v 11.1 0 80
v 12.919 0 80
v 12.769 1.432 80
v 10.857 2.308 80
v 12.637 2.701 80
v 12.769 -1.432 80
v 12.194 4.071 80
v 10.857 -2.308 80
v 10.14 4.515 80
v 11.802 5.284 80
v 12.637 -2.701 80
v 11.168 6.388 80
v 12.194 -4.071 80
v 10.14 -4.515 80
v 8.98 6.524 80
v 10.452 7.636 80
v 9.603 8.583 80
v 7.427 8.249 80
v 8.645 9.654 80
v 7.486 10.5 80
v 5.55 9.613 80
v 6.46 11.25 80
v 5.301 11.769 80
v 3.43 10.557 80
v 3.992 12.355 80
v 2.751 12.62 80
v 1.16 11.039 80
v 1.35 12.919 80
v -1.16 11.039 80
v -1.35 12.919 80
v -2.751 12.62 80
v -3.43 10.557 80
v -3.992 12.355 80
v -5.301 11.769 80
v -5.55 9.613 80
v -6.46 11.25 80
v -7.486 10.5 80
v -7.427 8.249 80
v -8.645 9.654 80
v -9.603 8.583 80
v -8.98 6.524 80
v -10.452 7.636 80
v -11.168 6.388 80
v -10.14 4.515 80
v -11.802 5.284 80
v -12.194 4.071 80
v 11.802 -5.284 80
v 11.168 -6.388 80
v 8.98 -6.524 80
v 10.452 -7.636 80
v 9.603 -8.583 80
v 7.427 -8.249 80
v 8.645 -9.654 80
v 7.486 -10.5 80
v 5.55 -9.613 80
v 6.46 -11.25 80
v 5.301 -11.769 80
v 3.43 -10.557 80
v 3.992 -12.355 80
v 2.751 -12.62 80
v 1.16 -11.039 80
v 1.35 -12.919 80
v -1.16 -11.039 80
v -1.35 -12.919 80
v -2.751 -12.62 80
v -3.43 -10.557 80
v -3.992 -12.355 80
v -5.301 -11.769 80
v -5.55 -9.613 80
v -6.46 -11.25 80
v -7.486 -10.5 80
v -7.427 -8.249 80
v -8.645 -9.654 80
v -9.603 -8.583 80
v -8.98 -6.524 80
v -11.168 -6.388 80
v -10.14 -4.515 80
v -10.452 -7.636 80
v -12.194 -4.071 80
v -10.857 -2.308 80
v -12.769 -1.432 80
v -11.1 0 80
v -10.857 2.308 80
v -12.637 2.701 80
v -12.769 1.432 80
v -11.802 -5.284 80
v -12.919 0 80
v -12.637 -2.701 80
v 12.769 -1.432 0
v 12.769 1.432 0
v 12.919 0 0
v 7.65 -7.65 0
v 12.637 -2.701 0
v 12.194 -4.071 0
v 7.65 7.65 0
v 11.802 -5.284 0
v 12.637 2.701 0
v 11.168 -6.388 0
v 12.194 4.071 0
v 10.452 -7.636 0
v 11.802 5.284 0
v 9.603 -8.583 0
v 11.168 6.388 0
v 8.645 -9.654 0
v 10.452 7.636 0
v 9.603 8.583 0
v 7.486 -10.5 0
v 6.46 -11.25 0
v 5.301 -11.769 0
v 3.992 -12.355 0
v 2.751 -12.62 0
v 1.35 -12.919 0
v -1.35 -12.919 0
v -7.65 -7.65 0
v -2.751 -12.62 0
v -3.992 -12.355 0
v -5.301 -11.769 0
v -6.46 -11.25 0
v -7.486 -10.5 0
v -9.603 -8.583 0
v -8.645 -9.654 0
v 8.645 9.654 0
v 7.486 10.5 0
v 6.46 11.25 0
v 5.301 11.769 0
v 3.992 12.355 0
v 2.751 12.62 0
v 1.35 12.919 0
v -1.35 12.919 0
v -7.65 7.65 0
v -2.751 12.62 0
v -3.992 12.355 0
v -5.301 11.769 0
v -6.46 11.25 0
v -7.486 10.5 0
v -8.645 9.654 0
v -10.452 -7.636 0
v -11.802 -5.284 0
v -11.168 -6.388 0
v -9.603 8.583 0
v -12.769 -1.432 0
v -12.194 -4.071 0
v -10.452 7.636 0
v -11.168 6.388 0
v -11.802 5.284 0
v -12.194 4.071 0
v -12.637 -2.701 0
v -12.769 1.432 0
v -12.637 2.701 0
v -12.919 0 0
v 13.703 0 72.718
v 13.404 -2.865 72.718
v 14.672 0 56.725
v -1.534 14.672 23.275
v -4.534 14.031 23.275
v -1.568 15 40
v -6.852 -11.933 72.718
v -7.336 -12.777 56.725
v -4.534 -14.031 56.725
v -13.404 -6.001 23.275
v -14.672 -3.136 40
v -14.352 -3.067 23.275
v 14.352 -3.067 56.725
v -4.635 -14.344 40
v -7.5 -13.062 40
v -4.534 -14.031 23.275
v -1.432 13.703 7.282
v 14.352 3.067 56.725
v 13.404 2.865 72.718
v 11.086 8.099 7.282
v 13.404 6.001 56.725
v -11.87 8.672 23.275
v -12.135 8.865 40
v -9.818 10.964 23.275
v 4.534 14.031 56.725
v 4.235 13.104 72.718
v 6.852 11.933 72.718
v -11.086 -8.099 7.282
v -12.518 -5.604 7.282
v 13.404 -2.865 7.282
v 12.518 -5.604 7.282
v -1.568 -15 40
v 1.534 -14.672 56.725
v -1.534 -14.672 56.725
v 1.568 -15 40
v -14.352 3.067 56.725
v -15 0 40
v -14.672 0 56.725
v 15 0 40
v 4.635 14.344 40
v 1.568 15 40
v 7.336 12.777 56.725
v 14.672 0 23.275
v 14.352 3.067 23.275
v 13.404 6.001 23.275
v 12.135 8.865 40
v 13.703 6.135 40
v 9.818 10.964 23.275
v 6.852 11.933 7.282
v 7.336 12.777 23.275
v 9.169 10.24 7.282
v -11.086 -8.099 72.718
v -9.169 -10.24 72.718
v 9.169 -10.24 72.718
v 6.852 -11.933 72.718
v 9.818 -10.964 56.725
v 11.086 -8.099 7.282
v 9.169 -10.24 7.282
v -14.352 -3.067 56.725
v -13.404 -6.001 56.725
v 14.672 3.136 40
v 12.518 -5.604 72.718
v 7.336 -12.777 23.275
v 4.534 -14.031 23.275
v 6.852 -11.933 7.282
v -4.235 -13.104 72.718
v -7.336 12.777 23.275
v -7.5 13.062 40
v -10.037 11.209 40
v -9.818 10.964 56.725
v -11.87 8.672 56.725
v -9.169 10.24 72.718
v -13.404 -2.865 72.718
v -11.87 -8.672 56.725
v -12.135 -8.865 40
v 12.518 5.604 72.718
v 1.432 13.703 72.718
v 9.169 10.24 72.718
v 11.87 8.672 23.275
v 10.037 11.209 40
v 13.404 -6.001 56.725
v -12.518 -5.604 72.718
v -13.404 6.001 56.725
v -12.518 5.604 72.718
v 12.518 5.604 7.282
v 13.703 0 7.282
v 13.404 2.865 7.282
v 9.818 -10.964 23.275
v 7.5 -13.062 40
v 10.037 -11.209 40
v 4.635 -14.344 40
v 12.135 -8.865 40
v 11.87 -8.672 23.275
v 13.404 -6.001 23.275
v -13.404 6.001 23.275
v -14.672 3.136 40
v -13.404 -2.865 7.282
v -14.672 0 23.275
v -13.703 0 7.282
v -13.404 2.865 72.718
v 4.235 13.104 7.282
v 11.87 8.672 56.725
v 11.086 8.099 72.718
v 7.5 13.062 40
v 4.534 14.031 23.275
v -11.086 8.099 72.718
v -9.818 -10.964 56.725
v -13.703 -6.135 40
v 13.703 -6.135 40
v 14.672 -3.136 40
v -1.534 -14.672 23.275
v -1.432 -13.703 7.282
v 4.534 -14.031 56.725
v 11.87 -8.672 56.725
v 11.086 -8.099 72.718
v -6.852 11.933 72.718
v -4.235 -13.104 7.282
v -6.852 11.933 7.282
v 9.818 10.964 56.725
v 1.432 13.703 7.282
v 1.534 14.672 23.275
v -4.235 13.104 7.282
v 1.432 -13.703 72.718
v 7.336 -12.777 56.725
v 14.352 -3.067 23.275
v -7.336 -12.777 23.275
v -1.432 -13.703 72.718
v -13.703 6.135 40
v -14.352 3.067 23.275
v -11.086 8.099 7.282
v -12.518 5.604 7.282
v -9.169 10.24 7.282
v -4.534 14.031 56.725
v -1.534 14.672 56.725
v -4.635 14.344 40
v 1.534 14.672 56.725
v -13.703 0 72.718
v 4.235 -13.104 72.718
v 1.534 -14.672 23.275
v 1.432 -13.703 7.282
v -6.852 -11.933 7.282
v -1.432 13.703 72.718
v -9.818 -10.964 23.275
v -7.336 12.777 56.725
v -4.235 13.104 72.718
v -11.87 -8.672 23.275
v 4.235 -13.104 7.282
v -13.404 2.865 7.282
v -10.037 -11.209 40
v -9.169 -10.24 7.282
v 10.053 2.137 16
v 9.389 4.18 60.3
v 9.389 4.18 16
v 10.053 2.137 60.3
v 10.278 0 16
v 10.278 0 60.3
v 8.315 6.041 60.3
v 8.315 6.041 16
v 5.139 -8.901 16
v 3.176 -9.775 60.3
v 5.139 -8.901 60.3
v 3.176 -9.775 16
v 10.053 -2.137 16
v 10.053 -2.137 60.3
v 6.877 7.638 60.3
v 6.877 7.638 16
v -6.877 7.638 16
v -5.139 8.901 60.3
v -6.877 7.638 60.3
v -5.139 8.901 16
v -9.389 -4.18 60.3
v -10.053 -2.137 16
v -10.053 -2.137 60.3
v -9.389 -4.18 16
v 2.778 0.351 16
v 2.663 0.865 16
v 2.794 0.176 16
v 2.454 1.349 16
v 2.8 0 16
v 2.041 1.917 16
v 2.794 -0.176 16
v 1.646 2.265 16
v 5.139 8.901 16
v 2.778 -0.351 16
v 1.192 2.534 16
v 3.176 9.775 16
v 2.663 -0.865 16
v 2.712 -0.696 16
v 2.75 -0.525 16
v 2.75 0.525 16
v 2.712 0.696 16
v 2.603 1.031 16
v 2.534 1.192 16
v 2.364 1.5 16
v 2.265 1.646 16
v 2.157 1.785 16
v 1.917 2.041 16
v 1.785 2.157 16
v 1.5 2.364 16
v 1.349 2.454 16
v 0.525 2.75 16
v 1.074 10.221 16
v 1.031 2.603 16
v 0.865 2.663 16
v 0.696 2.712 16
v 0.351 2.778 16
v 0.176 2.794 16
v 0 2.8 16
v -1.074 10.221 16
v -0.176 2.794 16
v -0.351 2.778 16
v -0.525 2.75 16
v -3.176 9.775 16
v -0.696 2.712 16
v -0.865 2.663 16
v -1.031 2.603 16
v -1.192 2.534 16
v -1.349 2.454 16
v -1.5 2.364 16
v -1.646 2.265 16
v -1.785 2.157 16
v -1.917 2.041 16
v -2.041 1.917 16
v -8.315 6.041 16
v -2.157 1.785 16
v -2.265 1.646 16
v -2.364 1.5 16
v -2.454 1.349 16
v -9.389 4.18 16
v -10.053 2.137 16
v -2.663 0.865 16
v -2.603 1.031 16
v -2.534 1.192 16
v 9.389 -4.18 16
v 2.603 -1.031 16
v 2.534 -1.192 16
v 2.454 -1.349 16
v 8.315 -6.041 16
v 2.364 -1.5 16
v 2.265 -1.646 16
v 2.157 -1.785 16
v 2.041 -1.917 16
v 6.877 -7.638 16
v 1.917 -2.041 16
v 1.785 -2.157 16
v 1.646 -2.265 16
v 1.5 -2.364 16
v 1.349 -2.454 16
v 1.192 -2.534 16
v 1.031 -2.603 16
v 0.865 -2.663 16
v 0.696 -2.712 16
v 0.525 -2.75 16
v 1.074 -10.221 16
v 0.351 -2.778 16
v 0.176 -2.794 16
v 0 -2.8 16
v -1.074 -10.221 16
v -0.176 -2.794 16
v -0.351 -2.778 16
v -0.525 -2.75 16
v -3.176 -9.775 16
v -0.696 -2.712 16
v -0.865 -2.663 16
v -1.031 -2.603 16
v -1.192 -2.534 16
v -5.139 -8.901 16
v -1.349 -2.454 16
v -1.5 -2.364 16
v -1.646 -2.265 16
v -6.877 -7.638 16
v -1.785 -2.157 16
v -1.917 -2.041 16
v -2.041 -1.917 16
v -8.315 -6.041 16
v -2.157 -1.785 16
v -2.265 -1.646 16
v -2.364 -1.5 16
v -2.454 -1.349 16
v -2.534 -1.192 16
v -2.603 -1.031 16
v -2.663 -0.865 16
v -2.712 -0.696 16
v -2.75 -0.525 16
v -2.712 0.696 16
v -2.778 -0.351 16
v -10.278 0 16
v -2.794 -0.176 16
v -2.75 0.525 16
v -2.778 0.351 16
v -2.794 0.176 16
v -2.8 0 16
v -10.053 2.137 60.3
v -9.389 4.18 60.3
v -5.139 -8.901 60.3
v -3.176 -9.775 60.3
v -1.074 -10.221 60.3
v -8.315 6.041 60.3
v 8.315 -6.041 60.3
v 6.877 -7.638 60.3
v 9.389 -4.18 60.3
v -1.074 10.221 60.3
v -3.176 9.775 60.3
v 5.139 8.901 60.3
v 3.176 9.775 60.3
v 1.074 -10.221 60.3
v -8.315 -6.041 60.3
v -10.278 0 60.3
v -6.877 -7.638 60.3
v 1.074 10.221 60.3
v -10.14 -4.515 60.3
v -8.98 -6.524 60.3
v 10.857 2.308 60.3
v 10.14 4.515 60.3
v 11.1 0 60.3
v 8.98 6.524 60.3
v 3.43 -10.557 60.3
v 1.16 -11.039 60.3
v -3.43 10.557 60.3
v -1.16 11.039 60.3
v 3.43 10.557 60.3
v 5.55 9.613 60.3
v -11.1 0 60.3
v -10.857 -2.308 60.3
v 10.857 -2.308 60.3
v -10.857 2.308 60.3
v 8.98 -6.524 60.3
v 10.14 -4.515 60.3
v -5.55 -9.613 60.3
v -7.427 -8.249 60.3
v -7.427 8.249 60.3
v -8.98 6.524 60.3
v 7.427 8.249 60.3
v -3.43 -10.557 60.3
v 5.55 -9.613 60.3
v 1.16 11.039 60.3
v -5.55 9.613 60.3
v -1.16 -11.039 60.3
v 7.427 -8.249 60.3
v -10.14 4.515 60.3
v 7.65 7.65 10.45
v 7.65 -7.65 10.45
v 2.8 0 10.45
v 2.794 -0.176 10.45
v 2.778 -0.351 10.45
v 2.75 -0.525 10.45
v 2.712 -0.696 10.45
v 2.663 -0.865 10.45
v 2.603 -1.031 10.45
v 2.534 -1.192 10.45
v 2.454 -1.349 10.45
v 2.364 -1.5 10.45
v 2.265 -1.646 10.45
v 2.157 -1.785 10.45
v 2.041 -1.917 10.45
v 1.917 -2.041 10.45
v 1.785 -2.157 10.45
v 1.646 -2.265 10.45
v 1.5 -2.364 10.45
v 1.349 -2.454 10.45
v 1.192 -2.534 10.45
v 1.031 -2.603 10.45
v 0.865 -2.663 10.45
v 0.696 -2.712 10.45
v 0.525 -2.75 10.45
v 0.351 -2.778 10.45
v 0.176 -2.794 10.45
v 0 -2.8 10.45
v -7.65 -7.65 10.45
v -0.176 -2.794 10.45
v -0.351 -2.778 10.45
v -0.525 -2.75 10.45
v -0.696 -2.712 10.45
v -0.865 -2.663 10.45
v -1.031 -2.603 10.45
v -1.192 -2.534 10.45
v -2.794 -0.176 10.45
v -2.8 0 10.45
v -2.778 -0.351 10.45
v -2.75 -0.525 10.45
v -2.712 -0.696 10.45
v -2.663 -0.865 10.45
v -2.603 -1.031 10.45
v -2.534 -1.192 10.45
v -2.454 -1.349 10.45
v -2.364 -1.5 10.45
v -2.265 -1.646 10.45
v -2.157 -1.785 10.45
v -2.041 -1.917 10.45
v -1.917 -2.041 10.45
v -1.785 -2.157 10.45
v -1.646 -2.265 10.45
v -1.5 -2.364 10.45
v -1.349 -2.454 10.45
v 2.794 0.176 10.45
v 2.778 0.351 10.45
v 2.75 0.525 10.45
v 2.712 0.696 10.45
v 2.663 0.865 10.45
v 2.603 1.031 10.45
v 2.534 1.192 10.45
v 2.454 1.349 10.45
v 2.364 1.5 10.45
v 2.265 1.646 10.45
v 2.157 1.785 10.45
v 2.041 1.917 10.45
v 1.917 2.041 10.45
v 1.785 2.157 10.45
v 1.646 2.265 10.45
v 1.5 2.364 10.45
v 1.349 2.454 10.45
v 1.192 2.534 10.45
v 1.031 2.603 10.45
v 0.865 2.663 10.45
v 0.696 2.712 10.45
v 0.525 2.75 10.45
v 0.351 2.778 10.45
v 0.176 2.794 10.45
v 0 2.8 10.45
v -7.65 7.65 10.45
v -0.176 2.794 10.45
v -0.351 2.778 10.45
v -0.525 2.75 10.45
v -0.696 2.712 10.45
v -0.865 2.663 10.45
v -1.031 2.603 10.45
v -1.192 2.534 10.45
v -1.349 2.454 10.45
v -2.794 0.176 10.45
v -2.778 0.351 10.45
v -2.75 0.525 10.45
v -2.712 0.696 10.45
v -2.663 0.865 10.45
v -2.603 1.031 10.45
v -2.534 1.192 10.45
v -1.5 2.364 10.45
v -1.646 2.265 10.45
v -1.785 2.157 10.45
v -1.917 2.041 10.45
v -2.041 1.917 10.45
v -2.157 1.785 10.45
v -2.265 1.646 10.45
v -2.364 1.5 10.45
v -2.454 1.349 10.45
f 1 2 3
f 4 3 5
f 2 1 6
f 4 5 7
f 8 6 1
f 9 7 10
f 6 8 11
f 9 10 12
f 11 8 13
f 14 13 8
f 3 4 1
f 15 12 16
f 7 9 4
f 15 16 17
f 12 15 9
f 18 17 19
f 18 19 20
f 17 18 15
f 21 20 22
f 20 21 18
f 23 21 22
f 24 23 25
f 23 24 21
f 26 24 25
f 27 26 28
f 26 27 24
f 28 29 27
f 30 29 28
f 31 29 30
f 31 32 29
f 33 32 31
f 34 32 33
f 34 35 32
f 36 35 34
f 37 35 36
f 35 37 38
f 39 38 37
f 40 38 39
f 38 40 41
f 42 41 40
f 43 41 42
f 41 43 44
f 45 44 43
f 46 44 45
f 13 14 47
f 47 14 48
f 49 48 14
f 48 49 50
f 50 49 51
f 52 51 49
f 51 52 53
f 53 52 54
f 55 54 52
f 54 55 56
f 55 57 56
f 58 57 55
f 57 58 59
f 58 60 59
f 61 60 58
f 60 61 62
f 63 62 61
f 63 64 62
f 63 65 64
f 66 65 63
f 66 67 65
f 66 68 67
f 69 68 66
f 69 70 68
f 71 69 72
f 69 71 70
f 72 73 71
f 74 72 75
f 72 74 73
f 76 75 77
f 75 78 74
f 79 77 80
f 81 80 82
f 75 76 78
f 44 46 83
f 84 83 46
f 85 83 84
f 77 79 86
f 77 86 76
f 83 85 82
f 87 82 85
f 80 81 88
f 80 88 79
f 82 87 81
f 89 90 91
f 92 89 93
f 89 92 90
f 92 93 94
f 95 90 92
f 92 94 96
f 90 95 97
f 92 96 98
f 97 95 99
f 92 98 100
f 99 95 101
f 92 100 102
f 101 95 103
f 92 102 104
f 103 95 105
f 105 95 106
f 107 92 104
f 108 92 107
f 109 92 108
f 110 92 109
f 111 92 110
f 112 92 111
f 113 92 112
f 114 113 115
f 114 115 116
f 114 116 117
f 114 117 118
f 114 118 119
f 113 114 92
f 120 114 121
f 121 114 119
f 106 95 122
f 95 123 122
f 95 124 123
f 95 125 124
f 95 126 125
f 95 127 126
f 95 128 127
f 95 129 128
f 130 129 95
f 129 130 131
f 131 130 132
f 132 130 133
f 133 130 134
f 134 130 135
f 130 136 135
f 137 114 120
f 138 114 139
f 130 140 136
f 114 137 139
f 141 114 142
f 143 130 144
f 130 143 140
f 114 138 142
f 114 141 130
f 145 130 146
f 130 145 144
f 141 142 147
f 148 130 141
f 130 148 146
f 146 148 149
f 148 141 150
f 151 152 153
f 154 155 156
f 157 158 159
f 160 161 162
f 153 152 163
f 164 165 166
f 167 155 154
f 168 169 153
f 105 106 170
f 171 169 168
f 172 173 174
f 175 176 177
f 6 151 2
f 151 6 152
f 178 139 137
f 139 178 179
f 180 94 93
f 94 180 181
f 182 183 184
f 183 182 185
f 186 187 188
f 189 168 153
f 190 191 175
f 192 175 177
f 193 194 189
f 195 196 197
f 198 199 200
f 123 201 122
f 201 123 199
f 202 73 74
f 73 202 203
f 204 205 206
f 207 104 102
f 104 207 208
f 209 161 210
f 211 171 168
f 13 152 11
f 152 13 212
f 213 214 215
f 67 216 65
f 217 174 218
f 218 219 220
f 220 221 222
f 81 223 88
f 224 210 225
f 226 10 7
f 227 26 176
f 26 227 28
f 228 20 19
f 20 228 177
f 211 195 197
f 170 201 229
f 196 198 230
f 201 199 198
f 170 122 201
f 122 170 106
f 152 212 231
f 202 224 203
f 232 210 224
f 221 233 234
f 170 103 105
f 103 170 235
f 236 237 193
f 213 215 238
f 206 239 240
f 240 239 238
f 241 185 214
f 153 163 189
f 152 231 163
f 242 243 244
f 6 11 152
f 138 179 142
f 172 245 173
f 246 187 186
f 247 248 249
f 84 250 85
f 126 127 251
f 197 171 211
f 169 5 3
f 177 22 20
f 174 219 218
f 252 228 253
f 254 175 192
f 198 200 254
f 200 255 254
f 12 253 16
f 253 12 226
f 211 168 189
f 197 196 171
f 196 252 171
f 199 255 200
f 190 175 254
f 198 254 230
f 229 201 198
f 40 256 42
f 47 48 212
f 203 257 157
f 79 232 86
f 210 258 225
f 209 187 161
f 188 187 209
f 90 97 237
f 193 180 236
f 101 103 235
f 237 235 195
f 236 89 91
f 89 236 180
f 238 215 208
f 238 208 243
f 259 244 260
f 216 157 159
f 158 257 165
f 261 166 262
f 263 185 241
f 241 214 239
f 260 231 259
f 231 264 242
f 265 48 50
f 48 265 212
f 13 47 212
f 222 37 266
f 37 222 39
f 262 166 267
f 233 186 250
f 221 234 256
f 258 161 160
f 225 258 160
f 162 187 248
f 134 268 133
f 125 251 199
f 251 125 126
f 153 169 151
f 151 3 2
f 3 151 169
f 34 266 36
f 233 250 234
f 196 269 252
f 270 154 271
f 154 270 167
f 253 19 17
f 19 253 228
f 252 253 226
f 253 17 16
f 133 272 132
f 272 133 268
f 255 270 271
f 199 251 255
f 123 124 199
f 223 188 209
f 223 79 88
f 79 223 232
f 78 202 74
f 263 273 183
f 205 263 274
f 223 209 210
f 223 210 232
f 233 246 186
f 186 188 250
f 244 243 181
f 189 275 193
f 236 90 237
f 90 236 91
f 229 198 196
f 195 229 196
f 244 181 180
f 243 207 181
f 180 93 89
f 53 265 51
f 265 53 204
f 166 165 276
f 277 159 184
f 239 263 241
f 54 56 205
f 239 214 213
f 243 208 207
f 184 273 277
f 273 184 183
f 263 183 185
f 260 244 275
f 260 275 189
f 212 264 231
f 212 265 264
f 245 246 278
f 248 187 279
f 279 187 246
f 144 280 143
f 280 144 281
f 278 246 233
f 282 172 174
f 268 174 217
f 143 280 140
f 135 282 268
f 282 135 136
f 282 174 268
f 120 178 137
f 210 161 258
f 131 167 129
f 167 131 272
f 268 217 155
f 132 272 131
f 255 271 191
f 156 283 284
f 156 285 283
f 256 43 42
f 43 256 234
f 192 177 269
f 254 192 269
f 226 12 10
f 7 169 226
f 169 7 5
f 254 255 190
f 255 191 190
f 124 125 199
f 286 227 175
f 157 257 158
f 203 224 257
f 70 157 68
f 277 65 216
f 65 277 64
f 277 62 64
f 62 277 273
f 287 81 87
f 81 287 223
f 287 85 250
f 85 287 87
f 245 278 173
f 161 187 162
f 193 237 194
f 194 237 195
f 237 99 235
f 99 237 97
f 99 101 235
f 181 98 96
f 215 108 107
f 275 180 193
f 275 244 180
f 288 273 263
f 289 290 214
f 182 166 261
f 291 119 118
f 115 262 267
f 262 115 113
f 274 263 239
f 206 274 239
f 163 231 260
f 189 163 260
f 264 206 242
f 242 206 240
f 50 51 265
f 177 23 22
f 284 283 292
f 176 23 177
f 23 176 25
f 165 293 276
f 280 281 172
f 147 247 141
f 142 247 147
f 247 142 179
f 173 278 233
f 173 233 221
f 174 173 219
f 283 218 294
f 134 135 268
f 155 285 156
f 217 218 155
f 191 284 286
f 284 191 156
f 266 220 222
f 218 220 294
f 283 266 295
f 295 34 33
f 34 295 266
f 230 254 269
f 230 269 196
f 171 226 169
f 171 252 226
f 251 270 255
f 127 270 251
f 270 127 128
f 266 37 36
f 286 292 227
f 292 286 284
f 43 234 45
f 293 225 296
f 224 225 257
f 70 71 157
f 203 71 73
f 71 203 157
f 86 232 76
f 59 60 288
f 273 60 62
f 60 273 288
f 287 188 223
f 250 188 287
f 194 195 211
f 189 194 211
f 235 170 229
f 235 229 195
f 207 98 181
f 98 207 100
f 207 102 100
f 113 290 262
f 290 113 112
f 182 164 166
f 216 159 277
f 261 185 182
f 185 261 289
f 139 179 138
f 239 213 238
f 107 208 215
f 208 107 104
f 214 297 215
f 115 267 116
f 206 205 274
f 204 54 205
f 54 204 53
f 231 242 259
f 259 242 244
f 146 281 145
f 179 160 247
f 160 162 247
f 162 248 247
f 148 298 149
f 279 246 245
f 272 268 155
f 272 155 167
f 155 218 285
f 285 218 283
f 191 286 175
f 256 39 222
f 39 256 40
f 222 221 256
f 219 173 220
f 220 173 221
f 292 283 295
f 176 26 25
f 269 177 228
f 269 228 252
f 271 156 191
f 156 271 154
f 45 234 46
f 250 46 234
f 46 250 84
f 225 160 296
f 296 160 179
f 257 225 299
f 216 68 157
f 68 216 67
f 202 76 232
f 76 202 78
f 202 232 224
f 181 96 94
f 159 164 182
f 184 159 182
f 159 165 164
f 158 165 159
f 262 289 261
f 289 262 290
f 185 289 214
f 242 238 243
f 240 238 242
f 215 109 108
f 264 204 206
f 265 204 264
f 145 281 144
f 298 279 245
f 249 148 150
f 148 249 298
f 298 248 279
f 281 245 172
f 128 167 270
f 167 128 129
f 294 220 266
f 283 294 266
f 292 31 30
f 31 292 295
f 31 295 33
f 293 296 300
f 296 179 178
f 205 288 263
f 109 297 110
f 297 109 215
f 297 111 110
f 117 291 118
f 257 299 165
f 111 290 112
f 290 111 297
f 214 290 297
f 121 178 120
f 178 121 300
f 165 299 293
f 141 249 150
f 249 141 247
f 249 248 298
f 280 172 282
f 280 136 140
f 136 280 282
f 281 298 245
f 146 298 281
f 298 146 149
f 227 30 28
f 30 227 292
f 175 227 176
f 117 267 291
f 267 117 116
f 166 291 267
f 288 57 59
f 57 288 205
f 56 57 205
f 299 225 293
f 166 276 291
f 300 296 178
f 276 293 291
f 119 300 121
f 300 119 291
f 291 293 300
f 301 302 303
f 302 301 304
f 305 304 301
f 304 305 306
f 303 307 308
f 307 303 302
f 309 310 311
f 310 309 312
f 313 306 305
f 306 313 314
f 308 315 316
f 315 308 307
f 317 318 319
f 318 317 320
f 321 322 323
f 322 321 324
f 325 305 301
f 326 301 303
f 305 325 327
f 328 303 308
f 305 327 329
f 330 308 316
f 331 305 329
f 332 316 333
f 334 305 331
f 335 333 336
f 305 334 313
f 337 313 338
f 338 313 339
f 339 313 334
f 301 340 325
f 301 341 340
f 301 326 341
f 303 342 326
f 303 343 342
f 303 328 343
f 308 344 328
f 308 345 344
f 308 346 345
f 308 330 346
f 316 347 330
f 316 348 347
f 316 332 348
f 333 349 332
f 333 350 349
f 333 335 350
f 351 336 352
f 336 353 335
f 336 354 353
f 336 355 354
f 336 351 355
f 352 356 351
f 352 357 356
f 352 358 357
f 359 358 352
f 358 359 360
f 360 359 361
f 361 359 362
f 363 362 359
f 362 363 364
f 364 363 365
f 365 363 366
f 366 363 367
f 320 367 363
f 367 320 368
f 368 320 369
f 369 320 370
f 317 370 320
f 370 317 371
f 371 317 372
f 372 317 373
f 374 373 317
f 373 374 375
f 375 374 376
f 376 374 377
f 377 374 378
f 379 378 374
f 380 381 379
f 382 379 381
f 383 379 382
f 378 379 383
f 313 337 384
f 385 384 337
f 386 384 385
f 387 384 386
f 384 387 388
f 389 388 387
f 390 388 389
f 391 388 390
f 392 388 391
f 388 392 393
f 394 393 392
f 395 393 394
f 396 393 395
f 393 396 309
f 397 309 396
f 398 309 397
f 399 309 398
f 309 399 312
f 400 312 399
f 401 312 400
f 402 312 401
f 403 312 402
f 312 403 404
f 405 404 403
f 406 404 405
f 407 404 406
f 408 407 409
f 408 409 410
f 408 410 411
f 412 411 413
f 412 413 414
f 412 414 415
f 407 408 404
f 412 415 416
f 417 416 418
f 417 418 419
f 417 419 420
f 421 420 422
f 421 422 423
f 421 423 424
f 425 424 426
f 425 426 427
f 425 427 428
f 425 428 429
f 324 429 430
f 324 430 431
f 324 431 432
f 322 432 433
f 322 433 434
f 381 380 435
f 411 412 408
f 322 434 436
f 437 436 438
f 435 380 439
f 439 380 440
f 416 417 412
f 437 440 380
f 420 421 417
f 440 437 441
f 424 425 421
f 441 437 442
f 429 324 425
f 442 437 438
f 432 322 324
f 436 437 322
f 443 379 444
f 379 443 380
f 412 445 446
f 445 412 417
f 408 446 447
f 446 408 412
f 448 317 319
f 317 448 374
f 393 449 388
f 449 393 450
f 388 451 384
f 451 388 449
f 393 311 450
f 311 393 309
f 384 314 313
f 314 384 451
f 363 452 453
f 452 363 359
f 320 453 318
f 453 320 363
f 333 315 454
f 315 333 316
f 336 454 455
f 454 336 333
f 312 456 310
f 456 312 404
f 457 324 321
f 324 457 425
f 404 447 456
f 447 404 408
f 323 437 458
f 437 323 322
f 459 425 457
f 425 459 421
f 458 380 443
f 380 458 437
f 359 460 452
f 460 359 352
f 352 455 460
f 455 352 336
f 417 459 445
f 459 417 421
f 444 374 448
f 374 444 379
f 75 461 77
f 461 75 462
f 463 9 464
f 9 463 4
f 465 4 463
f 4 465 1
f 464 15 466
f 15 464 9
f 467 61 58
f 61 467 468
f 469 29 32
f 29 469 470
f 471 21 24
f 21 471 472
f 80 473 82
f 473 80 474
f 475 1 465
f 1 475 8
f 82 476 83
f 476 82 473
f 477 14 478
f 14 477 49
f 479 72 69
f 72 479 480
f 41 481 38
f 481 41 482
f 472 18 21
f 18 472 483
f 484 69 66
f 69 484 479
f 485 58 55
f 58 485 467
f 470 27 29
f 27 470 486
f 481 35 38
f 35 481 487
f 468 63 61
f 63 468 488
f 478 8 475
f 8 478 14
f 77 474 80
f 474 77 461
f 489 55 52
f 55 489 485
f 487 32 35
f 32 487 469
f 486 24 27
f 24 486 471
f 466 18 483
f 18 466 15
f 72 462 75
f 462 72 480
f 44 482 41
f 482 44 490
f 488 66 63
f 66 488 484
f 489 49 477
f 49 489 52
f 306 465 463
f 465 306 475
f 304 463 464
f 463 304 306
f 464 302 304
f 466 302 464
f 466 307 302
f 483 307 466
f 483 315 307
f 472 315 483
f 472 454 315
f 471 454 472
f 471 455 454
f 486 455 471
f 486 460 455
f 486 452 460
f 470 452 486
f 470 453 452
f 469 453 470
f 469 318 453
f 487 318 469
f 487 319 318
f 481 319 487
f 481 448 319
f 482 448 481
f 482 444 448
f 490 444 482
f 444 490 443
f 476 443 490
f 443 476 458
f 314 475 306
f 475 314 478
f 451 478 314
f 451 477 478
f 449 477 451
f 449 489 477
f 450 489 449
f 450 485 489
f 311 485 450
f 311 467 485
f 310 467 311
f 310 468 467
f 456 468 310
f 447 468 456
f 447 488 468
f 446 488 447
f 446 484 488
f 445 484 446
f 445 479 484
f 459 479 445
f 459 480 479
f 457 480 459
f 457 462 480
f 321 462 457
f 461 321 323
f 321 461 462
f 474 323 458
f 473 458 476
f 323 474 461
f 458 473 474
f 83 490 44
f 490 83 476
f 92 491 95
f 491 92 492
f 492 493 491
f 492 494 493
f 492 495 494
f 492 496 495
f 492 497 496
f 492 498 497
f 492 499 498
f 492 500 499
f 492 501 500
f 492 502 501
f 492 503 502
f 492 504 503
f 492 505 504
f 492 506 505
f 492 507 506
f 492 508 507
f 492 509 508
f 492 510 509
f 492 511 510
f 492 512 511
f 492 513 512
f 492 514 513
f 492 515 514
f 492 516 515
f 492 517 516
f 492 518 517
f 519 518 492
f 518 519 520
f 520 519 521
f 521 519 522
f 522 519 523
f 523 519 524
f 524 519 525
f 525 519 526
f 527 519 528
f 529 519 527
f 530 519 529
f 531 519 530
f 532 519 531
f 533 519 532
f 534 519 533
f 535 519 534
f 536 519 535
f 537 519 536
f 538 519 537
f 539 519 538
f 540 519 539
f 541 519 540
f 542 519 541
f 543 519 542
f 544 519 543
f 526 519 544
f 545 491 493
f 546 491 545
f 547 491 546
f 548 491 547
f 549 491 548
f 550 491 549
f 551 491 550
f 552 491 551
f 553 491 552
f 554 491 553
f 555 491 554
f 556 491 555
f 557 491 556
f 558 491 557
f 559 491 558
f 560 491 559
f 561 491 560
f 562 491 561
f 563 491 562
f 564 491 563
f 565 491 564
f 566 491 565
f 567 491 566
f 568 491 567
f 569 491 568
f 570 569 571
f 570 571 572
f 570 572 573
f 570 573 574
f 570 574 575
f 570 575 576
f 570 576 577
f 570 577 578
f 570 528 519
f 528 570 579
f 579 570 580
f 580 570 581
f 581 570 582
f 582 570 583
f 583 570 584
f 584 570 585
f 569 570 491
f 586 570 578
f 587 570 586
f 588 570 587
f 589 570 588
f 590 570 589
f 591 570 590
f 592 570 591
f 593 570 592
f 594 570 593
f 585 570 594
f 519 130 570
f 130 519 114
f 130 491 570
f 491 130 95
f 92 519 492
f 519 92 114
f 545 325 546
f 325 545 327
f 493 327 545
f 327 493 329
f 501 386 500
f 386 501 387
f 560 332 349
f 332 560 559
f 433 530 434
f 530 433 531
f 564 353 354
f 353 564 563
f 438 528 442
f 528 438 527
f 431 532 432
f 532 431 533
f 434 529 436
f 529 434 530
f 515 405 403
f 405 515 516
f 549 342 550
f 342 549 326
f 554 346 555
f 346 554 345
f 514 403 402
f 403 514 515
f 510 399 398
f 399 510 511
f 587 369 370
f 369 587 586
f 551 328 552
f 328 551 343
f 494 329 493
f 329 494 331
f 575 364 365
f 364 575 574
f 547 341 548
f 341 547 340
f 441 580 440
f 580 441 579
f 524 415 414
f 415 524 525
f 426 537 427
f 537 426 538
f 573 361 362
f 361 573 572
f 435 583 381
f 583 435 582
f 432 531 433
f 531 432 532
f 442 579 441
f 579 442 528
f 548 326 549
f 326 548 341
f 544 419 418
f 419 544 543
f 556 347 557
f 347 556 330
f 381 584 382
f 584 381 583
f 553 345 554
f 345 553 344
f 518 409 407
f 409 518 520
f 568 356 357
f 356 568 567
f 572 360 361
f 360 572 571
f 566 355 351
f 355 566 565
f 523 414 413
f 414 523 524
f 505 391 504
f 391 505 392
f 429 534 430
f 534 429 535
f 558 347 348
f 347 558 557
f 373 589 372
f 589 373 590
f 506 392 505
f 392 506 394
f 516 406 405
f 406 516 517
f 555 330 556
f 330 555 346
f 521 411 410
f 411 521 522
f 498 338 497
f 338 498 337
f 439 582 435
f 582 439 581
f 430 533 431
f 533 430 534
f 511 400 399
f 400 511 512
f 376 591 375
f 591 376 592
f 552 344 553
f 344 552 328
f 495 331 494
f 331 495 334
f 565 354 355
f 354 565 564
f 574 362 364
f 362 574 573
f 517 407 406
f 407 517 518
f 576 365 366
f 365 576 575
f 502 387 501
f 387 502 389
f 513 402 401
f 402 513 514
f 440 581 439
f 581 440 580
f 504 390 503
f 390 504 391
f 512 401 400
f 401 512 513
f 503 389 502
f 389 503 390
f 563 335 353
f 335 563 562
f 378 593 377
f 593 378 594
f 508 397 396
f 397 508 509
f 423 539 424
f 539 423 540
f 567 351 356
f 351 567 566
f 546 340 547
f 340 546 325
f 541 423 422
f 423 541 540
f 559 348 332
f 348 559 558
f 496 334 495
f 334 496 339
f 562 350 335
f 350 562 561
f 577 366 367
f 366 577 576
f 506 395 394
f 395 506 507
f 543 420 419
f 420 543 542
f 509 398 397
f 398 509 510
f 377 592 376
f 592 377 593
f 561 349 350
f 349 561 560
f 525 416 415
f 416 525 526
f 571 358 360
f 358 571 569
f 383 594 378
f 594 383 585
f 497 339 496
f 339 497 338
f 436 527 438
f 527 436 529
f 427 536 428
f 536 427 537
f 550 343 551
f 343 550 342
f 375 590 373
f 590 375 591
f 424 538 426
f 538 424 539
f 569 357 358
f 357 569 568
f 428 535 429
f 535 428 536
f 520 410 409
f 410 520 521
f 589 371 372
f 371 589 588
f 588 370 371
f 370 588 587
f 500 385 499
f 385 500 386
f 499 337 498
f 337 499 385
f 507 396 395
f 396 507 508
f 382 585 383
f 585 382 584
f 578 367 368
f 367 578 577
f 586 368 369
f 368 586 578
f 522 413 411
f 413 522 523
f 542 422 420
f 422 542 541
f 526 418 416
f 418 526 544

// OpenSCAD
// Jim Samson
// Spool with teeth for rat project 
// November 14, 2018



beltHeight=80; // millimeters
diameterForBelt=30;

diameterForEdgesHeight=2;
diameterForEdges = diameterForBelt + 4;

bearingDiameter=22.2;
bearingHeight=8;

spoolHolder();

//translate([20,0,0]) cube([10,10,80]);


module spoolHolder() {
    union() {
        difference() {
            spool();
            middleShaft();
            bearings();
            gear();
            tube();
        }
    }
}

module tube() {
    translate([0,0,-1]) {
        cylinder(d=5.6,h=beltHeight+1,$fn=100);
    }
}

module gear() {
   //translate([-11,-11.1,-1]) {
        //import("SGearSpurV1_fixed.stl", convexity=10); 
    //}
    translate([0,0,14-12.7]) {
        cube([15.3,15.3,31-12.7],center=true);
    }
}

module teethHolder() {
    cylinder(d=bearingDiameter,h=beltHeight);
}

module middleShaft() {
    translate([0,0,16]) {
        cylinder(d=bearingDiameter/1.08,h=beltHeight);
    }
}

module bearings() {
    translate([0,0,beltHeight-bearingHeight+1-12.7]) {
        #cylinder(d=bearingDiameter,h=bearingHeight+12);
    }
}

module spool() {
    translate([0,0,beltHeight/2]) {
        intersection() {
            cube([beltHeight,beltHeight,beltHeight], center=true); 
            resize([diameterForBelt,diameterForBelt,beltHeight*2])
            sphere(r=10);
        }
    }
}
